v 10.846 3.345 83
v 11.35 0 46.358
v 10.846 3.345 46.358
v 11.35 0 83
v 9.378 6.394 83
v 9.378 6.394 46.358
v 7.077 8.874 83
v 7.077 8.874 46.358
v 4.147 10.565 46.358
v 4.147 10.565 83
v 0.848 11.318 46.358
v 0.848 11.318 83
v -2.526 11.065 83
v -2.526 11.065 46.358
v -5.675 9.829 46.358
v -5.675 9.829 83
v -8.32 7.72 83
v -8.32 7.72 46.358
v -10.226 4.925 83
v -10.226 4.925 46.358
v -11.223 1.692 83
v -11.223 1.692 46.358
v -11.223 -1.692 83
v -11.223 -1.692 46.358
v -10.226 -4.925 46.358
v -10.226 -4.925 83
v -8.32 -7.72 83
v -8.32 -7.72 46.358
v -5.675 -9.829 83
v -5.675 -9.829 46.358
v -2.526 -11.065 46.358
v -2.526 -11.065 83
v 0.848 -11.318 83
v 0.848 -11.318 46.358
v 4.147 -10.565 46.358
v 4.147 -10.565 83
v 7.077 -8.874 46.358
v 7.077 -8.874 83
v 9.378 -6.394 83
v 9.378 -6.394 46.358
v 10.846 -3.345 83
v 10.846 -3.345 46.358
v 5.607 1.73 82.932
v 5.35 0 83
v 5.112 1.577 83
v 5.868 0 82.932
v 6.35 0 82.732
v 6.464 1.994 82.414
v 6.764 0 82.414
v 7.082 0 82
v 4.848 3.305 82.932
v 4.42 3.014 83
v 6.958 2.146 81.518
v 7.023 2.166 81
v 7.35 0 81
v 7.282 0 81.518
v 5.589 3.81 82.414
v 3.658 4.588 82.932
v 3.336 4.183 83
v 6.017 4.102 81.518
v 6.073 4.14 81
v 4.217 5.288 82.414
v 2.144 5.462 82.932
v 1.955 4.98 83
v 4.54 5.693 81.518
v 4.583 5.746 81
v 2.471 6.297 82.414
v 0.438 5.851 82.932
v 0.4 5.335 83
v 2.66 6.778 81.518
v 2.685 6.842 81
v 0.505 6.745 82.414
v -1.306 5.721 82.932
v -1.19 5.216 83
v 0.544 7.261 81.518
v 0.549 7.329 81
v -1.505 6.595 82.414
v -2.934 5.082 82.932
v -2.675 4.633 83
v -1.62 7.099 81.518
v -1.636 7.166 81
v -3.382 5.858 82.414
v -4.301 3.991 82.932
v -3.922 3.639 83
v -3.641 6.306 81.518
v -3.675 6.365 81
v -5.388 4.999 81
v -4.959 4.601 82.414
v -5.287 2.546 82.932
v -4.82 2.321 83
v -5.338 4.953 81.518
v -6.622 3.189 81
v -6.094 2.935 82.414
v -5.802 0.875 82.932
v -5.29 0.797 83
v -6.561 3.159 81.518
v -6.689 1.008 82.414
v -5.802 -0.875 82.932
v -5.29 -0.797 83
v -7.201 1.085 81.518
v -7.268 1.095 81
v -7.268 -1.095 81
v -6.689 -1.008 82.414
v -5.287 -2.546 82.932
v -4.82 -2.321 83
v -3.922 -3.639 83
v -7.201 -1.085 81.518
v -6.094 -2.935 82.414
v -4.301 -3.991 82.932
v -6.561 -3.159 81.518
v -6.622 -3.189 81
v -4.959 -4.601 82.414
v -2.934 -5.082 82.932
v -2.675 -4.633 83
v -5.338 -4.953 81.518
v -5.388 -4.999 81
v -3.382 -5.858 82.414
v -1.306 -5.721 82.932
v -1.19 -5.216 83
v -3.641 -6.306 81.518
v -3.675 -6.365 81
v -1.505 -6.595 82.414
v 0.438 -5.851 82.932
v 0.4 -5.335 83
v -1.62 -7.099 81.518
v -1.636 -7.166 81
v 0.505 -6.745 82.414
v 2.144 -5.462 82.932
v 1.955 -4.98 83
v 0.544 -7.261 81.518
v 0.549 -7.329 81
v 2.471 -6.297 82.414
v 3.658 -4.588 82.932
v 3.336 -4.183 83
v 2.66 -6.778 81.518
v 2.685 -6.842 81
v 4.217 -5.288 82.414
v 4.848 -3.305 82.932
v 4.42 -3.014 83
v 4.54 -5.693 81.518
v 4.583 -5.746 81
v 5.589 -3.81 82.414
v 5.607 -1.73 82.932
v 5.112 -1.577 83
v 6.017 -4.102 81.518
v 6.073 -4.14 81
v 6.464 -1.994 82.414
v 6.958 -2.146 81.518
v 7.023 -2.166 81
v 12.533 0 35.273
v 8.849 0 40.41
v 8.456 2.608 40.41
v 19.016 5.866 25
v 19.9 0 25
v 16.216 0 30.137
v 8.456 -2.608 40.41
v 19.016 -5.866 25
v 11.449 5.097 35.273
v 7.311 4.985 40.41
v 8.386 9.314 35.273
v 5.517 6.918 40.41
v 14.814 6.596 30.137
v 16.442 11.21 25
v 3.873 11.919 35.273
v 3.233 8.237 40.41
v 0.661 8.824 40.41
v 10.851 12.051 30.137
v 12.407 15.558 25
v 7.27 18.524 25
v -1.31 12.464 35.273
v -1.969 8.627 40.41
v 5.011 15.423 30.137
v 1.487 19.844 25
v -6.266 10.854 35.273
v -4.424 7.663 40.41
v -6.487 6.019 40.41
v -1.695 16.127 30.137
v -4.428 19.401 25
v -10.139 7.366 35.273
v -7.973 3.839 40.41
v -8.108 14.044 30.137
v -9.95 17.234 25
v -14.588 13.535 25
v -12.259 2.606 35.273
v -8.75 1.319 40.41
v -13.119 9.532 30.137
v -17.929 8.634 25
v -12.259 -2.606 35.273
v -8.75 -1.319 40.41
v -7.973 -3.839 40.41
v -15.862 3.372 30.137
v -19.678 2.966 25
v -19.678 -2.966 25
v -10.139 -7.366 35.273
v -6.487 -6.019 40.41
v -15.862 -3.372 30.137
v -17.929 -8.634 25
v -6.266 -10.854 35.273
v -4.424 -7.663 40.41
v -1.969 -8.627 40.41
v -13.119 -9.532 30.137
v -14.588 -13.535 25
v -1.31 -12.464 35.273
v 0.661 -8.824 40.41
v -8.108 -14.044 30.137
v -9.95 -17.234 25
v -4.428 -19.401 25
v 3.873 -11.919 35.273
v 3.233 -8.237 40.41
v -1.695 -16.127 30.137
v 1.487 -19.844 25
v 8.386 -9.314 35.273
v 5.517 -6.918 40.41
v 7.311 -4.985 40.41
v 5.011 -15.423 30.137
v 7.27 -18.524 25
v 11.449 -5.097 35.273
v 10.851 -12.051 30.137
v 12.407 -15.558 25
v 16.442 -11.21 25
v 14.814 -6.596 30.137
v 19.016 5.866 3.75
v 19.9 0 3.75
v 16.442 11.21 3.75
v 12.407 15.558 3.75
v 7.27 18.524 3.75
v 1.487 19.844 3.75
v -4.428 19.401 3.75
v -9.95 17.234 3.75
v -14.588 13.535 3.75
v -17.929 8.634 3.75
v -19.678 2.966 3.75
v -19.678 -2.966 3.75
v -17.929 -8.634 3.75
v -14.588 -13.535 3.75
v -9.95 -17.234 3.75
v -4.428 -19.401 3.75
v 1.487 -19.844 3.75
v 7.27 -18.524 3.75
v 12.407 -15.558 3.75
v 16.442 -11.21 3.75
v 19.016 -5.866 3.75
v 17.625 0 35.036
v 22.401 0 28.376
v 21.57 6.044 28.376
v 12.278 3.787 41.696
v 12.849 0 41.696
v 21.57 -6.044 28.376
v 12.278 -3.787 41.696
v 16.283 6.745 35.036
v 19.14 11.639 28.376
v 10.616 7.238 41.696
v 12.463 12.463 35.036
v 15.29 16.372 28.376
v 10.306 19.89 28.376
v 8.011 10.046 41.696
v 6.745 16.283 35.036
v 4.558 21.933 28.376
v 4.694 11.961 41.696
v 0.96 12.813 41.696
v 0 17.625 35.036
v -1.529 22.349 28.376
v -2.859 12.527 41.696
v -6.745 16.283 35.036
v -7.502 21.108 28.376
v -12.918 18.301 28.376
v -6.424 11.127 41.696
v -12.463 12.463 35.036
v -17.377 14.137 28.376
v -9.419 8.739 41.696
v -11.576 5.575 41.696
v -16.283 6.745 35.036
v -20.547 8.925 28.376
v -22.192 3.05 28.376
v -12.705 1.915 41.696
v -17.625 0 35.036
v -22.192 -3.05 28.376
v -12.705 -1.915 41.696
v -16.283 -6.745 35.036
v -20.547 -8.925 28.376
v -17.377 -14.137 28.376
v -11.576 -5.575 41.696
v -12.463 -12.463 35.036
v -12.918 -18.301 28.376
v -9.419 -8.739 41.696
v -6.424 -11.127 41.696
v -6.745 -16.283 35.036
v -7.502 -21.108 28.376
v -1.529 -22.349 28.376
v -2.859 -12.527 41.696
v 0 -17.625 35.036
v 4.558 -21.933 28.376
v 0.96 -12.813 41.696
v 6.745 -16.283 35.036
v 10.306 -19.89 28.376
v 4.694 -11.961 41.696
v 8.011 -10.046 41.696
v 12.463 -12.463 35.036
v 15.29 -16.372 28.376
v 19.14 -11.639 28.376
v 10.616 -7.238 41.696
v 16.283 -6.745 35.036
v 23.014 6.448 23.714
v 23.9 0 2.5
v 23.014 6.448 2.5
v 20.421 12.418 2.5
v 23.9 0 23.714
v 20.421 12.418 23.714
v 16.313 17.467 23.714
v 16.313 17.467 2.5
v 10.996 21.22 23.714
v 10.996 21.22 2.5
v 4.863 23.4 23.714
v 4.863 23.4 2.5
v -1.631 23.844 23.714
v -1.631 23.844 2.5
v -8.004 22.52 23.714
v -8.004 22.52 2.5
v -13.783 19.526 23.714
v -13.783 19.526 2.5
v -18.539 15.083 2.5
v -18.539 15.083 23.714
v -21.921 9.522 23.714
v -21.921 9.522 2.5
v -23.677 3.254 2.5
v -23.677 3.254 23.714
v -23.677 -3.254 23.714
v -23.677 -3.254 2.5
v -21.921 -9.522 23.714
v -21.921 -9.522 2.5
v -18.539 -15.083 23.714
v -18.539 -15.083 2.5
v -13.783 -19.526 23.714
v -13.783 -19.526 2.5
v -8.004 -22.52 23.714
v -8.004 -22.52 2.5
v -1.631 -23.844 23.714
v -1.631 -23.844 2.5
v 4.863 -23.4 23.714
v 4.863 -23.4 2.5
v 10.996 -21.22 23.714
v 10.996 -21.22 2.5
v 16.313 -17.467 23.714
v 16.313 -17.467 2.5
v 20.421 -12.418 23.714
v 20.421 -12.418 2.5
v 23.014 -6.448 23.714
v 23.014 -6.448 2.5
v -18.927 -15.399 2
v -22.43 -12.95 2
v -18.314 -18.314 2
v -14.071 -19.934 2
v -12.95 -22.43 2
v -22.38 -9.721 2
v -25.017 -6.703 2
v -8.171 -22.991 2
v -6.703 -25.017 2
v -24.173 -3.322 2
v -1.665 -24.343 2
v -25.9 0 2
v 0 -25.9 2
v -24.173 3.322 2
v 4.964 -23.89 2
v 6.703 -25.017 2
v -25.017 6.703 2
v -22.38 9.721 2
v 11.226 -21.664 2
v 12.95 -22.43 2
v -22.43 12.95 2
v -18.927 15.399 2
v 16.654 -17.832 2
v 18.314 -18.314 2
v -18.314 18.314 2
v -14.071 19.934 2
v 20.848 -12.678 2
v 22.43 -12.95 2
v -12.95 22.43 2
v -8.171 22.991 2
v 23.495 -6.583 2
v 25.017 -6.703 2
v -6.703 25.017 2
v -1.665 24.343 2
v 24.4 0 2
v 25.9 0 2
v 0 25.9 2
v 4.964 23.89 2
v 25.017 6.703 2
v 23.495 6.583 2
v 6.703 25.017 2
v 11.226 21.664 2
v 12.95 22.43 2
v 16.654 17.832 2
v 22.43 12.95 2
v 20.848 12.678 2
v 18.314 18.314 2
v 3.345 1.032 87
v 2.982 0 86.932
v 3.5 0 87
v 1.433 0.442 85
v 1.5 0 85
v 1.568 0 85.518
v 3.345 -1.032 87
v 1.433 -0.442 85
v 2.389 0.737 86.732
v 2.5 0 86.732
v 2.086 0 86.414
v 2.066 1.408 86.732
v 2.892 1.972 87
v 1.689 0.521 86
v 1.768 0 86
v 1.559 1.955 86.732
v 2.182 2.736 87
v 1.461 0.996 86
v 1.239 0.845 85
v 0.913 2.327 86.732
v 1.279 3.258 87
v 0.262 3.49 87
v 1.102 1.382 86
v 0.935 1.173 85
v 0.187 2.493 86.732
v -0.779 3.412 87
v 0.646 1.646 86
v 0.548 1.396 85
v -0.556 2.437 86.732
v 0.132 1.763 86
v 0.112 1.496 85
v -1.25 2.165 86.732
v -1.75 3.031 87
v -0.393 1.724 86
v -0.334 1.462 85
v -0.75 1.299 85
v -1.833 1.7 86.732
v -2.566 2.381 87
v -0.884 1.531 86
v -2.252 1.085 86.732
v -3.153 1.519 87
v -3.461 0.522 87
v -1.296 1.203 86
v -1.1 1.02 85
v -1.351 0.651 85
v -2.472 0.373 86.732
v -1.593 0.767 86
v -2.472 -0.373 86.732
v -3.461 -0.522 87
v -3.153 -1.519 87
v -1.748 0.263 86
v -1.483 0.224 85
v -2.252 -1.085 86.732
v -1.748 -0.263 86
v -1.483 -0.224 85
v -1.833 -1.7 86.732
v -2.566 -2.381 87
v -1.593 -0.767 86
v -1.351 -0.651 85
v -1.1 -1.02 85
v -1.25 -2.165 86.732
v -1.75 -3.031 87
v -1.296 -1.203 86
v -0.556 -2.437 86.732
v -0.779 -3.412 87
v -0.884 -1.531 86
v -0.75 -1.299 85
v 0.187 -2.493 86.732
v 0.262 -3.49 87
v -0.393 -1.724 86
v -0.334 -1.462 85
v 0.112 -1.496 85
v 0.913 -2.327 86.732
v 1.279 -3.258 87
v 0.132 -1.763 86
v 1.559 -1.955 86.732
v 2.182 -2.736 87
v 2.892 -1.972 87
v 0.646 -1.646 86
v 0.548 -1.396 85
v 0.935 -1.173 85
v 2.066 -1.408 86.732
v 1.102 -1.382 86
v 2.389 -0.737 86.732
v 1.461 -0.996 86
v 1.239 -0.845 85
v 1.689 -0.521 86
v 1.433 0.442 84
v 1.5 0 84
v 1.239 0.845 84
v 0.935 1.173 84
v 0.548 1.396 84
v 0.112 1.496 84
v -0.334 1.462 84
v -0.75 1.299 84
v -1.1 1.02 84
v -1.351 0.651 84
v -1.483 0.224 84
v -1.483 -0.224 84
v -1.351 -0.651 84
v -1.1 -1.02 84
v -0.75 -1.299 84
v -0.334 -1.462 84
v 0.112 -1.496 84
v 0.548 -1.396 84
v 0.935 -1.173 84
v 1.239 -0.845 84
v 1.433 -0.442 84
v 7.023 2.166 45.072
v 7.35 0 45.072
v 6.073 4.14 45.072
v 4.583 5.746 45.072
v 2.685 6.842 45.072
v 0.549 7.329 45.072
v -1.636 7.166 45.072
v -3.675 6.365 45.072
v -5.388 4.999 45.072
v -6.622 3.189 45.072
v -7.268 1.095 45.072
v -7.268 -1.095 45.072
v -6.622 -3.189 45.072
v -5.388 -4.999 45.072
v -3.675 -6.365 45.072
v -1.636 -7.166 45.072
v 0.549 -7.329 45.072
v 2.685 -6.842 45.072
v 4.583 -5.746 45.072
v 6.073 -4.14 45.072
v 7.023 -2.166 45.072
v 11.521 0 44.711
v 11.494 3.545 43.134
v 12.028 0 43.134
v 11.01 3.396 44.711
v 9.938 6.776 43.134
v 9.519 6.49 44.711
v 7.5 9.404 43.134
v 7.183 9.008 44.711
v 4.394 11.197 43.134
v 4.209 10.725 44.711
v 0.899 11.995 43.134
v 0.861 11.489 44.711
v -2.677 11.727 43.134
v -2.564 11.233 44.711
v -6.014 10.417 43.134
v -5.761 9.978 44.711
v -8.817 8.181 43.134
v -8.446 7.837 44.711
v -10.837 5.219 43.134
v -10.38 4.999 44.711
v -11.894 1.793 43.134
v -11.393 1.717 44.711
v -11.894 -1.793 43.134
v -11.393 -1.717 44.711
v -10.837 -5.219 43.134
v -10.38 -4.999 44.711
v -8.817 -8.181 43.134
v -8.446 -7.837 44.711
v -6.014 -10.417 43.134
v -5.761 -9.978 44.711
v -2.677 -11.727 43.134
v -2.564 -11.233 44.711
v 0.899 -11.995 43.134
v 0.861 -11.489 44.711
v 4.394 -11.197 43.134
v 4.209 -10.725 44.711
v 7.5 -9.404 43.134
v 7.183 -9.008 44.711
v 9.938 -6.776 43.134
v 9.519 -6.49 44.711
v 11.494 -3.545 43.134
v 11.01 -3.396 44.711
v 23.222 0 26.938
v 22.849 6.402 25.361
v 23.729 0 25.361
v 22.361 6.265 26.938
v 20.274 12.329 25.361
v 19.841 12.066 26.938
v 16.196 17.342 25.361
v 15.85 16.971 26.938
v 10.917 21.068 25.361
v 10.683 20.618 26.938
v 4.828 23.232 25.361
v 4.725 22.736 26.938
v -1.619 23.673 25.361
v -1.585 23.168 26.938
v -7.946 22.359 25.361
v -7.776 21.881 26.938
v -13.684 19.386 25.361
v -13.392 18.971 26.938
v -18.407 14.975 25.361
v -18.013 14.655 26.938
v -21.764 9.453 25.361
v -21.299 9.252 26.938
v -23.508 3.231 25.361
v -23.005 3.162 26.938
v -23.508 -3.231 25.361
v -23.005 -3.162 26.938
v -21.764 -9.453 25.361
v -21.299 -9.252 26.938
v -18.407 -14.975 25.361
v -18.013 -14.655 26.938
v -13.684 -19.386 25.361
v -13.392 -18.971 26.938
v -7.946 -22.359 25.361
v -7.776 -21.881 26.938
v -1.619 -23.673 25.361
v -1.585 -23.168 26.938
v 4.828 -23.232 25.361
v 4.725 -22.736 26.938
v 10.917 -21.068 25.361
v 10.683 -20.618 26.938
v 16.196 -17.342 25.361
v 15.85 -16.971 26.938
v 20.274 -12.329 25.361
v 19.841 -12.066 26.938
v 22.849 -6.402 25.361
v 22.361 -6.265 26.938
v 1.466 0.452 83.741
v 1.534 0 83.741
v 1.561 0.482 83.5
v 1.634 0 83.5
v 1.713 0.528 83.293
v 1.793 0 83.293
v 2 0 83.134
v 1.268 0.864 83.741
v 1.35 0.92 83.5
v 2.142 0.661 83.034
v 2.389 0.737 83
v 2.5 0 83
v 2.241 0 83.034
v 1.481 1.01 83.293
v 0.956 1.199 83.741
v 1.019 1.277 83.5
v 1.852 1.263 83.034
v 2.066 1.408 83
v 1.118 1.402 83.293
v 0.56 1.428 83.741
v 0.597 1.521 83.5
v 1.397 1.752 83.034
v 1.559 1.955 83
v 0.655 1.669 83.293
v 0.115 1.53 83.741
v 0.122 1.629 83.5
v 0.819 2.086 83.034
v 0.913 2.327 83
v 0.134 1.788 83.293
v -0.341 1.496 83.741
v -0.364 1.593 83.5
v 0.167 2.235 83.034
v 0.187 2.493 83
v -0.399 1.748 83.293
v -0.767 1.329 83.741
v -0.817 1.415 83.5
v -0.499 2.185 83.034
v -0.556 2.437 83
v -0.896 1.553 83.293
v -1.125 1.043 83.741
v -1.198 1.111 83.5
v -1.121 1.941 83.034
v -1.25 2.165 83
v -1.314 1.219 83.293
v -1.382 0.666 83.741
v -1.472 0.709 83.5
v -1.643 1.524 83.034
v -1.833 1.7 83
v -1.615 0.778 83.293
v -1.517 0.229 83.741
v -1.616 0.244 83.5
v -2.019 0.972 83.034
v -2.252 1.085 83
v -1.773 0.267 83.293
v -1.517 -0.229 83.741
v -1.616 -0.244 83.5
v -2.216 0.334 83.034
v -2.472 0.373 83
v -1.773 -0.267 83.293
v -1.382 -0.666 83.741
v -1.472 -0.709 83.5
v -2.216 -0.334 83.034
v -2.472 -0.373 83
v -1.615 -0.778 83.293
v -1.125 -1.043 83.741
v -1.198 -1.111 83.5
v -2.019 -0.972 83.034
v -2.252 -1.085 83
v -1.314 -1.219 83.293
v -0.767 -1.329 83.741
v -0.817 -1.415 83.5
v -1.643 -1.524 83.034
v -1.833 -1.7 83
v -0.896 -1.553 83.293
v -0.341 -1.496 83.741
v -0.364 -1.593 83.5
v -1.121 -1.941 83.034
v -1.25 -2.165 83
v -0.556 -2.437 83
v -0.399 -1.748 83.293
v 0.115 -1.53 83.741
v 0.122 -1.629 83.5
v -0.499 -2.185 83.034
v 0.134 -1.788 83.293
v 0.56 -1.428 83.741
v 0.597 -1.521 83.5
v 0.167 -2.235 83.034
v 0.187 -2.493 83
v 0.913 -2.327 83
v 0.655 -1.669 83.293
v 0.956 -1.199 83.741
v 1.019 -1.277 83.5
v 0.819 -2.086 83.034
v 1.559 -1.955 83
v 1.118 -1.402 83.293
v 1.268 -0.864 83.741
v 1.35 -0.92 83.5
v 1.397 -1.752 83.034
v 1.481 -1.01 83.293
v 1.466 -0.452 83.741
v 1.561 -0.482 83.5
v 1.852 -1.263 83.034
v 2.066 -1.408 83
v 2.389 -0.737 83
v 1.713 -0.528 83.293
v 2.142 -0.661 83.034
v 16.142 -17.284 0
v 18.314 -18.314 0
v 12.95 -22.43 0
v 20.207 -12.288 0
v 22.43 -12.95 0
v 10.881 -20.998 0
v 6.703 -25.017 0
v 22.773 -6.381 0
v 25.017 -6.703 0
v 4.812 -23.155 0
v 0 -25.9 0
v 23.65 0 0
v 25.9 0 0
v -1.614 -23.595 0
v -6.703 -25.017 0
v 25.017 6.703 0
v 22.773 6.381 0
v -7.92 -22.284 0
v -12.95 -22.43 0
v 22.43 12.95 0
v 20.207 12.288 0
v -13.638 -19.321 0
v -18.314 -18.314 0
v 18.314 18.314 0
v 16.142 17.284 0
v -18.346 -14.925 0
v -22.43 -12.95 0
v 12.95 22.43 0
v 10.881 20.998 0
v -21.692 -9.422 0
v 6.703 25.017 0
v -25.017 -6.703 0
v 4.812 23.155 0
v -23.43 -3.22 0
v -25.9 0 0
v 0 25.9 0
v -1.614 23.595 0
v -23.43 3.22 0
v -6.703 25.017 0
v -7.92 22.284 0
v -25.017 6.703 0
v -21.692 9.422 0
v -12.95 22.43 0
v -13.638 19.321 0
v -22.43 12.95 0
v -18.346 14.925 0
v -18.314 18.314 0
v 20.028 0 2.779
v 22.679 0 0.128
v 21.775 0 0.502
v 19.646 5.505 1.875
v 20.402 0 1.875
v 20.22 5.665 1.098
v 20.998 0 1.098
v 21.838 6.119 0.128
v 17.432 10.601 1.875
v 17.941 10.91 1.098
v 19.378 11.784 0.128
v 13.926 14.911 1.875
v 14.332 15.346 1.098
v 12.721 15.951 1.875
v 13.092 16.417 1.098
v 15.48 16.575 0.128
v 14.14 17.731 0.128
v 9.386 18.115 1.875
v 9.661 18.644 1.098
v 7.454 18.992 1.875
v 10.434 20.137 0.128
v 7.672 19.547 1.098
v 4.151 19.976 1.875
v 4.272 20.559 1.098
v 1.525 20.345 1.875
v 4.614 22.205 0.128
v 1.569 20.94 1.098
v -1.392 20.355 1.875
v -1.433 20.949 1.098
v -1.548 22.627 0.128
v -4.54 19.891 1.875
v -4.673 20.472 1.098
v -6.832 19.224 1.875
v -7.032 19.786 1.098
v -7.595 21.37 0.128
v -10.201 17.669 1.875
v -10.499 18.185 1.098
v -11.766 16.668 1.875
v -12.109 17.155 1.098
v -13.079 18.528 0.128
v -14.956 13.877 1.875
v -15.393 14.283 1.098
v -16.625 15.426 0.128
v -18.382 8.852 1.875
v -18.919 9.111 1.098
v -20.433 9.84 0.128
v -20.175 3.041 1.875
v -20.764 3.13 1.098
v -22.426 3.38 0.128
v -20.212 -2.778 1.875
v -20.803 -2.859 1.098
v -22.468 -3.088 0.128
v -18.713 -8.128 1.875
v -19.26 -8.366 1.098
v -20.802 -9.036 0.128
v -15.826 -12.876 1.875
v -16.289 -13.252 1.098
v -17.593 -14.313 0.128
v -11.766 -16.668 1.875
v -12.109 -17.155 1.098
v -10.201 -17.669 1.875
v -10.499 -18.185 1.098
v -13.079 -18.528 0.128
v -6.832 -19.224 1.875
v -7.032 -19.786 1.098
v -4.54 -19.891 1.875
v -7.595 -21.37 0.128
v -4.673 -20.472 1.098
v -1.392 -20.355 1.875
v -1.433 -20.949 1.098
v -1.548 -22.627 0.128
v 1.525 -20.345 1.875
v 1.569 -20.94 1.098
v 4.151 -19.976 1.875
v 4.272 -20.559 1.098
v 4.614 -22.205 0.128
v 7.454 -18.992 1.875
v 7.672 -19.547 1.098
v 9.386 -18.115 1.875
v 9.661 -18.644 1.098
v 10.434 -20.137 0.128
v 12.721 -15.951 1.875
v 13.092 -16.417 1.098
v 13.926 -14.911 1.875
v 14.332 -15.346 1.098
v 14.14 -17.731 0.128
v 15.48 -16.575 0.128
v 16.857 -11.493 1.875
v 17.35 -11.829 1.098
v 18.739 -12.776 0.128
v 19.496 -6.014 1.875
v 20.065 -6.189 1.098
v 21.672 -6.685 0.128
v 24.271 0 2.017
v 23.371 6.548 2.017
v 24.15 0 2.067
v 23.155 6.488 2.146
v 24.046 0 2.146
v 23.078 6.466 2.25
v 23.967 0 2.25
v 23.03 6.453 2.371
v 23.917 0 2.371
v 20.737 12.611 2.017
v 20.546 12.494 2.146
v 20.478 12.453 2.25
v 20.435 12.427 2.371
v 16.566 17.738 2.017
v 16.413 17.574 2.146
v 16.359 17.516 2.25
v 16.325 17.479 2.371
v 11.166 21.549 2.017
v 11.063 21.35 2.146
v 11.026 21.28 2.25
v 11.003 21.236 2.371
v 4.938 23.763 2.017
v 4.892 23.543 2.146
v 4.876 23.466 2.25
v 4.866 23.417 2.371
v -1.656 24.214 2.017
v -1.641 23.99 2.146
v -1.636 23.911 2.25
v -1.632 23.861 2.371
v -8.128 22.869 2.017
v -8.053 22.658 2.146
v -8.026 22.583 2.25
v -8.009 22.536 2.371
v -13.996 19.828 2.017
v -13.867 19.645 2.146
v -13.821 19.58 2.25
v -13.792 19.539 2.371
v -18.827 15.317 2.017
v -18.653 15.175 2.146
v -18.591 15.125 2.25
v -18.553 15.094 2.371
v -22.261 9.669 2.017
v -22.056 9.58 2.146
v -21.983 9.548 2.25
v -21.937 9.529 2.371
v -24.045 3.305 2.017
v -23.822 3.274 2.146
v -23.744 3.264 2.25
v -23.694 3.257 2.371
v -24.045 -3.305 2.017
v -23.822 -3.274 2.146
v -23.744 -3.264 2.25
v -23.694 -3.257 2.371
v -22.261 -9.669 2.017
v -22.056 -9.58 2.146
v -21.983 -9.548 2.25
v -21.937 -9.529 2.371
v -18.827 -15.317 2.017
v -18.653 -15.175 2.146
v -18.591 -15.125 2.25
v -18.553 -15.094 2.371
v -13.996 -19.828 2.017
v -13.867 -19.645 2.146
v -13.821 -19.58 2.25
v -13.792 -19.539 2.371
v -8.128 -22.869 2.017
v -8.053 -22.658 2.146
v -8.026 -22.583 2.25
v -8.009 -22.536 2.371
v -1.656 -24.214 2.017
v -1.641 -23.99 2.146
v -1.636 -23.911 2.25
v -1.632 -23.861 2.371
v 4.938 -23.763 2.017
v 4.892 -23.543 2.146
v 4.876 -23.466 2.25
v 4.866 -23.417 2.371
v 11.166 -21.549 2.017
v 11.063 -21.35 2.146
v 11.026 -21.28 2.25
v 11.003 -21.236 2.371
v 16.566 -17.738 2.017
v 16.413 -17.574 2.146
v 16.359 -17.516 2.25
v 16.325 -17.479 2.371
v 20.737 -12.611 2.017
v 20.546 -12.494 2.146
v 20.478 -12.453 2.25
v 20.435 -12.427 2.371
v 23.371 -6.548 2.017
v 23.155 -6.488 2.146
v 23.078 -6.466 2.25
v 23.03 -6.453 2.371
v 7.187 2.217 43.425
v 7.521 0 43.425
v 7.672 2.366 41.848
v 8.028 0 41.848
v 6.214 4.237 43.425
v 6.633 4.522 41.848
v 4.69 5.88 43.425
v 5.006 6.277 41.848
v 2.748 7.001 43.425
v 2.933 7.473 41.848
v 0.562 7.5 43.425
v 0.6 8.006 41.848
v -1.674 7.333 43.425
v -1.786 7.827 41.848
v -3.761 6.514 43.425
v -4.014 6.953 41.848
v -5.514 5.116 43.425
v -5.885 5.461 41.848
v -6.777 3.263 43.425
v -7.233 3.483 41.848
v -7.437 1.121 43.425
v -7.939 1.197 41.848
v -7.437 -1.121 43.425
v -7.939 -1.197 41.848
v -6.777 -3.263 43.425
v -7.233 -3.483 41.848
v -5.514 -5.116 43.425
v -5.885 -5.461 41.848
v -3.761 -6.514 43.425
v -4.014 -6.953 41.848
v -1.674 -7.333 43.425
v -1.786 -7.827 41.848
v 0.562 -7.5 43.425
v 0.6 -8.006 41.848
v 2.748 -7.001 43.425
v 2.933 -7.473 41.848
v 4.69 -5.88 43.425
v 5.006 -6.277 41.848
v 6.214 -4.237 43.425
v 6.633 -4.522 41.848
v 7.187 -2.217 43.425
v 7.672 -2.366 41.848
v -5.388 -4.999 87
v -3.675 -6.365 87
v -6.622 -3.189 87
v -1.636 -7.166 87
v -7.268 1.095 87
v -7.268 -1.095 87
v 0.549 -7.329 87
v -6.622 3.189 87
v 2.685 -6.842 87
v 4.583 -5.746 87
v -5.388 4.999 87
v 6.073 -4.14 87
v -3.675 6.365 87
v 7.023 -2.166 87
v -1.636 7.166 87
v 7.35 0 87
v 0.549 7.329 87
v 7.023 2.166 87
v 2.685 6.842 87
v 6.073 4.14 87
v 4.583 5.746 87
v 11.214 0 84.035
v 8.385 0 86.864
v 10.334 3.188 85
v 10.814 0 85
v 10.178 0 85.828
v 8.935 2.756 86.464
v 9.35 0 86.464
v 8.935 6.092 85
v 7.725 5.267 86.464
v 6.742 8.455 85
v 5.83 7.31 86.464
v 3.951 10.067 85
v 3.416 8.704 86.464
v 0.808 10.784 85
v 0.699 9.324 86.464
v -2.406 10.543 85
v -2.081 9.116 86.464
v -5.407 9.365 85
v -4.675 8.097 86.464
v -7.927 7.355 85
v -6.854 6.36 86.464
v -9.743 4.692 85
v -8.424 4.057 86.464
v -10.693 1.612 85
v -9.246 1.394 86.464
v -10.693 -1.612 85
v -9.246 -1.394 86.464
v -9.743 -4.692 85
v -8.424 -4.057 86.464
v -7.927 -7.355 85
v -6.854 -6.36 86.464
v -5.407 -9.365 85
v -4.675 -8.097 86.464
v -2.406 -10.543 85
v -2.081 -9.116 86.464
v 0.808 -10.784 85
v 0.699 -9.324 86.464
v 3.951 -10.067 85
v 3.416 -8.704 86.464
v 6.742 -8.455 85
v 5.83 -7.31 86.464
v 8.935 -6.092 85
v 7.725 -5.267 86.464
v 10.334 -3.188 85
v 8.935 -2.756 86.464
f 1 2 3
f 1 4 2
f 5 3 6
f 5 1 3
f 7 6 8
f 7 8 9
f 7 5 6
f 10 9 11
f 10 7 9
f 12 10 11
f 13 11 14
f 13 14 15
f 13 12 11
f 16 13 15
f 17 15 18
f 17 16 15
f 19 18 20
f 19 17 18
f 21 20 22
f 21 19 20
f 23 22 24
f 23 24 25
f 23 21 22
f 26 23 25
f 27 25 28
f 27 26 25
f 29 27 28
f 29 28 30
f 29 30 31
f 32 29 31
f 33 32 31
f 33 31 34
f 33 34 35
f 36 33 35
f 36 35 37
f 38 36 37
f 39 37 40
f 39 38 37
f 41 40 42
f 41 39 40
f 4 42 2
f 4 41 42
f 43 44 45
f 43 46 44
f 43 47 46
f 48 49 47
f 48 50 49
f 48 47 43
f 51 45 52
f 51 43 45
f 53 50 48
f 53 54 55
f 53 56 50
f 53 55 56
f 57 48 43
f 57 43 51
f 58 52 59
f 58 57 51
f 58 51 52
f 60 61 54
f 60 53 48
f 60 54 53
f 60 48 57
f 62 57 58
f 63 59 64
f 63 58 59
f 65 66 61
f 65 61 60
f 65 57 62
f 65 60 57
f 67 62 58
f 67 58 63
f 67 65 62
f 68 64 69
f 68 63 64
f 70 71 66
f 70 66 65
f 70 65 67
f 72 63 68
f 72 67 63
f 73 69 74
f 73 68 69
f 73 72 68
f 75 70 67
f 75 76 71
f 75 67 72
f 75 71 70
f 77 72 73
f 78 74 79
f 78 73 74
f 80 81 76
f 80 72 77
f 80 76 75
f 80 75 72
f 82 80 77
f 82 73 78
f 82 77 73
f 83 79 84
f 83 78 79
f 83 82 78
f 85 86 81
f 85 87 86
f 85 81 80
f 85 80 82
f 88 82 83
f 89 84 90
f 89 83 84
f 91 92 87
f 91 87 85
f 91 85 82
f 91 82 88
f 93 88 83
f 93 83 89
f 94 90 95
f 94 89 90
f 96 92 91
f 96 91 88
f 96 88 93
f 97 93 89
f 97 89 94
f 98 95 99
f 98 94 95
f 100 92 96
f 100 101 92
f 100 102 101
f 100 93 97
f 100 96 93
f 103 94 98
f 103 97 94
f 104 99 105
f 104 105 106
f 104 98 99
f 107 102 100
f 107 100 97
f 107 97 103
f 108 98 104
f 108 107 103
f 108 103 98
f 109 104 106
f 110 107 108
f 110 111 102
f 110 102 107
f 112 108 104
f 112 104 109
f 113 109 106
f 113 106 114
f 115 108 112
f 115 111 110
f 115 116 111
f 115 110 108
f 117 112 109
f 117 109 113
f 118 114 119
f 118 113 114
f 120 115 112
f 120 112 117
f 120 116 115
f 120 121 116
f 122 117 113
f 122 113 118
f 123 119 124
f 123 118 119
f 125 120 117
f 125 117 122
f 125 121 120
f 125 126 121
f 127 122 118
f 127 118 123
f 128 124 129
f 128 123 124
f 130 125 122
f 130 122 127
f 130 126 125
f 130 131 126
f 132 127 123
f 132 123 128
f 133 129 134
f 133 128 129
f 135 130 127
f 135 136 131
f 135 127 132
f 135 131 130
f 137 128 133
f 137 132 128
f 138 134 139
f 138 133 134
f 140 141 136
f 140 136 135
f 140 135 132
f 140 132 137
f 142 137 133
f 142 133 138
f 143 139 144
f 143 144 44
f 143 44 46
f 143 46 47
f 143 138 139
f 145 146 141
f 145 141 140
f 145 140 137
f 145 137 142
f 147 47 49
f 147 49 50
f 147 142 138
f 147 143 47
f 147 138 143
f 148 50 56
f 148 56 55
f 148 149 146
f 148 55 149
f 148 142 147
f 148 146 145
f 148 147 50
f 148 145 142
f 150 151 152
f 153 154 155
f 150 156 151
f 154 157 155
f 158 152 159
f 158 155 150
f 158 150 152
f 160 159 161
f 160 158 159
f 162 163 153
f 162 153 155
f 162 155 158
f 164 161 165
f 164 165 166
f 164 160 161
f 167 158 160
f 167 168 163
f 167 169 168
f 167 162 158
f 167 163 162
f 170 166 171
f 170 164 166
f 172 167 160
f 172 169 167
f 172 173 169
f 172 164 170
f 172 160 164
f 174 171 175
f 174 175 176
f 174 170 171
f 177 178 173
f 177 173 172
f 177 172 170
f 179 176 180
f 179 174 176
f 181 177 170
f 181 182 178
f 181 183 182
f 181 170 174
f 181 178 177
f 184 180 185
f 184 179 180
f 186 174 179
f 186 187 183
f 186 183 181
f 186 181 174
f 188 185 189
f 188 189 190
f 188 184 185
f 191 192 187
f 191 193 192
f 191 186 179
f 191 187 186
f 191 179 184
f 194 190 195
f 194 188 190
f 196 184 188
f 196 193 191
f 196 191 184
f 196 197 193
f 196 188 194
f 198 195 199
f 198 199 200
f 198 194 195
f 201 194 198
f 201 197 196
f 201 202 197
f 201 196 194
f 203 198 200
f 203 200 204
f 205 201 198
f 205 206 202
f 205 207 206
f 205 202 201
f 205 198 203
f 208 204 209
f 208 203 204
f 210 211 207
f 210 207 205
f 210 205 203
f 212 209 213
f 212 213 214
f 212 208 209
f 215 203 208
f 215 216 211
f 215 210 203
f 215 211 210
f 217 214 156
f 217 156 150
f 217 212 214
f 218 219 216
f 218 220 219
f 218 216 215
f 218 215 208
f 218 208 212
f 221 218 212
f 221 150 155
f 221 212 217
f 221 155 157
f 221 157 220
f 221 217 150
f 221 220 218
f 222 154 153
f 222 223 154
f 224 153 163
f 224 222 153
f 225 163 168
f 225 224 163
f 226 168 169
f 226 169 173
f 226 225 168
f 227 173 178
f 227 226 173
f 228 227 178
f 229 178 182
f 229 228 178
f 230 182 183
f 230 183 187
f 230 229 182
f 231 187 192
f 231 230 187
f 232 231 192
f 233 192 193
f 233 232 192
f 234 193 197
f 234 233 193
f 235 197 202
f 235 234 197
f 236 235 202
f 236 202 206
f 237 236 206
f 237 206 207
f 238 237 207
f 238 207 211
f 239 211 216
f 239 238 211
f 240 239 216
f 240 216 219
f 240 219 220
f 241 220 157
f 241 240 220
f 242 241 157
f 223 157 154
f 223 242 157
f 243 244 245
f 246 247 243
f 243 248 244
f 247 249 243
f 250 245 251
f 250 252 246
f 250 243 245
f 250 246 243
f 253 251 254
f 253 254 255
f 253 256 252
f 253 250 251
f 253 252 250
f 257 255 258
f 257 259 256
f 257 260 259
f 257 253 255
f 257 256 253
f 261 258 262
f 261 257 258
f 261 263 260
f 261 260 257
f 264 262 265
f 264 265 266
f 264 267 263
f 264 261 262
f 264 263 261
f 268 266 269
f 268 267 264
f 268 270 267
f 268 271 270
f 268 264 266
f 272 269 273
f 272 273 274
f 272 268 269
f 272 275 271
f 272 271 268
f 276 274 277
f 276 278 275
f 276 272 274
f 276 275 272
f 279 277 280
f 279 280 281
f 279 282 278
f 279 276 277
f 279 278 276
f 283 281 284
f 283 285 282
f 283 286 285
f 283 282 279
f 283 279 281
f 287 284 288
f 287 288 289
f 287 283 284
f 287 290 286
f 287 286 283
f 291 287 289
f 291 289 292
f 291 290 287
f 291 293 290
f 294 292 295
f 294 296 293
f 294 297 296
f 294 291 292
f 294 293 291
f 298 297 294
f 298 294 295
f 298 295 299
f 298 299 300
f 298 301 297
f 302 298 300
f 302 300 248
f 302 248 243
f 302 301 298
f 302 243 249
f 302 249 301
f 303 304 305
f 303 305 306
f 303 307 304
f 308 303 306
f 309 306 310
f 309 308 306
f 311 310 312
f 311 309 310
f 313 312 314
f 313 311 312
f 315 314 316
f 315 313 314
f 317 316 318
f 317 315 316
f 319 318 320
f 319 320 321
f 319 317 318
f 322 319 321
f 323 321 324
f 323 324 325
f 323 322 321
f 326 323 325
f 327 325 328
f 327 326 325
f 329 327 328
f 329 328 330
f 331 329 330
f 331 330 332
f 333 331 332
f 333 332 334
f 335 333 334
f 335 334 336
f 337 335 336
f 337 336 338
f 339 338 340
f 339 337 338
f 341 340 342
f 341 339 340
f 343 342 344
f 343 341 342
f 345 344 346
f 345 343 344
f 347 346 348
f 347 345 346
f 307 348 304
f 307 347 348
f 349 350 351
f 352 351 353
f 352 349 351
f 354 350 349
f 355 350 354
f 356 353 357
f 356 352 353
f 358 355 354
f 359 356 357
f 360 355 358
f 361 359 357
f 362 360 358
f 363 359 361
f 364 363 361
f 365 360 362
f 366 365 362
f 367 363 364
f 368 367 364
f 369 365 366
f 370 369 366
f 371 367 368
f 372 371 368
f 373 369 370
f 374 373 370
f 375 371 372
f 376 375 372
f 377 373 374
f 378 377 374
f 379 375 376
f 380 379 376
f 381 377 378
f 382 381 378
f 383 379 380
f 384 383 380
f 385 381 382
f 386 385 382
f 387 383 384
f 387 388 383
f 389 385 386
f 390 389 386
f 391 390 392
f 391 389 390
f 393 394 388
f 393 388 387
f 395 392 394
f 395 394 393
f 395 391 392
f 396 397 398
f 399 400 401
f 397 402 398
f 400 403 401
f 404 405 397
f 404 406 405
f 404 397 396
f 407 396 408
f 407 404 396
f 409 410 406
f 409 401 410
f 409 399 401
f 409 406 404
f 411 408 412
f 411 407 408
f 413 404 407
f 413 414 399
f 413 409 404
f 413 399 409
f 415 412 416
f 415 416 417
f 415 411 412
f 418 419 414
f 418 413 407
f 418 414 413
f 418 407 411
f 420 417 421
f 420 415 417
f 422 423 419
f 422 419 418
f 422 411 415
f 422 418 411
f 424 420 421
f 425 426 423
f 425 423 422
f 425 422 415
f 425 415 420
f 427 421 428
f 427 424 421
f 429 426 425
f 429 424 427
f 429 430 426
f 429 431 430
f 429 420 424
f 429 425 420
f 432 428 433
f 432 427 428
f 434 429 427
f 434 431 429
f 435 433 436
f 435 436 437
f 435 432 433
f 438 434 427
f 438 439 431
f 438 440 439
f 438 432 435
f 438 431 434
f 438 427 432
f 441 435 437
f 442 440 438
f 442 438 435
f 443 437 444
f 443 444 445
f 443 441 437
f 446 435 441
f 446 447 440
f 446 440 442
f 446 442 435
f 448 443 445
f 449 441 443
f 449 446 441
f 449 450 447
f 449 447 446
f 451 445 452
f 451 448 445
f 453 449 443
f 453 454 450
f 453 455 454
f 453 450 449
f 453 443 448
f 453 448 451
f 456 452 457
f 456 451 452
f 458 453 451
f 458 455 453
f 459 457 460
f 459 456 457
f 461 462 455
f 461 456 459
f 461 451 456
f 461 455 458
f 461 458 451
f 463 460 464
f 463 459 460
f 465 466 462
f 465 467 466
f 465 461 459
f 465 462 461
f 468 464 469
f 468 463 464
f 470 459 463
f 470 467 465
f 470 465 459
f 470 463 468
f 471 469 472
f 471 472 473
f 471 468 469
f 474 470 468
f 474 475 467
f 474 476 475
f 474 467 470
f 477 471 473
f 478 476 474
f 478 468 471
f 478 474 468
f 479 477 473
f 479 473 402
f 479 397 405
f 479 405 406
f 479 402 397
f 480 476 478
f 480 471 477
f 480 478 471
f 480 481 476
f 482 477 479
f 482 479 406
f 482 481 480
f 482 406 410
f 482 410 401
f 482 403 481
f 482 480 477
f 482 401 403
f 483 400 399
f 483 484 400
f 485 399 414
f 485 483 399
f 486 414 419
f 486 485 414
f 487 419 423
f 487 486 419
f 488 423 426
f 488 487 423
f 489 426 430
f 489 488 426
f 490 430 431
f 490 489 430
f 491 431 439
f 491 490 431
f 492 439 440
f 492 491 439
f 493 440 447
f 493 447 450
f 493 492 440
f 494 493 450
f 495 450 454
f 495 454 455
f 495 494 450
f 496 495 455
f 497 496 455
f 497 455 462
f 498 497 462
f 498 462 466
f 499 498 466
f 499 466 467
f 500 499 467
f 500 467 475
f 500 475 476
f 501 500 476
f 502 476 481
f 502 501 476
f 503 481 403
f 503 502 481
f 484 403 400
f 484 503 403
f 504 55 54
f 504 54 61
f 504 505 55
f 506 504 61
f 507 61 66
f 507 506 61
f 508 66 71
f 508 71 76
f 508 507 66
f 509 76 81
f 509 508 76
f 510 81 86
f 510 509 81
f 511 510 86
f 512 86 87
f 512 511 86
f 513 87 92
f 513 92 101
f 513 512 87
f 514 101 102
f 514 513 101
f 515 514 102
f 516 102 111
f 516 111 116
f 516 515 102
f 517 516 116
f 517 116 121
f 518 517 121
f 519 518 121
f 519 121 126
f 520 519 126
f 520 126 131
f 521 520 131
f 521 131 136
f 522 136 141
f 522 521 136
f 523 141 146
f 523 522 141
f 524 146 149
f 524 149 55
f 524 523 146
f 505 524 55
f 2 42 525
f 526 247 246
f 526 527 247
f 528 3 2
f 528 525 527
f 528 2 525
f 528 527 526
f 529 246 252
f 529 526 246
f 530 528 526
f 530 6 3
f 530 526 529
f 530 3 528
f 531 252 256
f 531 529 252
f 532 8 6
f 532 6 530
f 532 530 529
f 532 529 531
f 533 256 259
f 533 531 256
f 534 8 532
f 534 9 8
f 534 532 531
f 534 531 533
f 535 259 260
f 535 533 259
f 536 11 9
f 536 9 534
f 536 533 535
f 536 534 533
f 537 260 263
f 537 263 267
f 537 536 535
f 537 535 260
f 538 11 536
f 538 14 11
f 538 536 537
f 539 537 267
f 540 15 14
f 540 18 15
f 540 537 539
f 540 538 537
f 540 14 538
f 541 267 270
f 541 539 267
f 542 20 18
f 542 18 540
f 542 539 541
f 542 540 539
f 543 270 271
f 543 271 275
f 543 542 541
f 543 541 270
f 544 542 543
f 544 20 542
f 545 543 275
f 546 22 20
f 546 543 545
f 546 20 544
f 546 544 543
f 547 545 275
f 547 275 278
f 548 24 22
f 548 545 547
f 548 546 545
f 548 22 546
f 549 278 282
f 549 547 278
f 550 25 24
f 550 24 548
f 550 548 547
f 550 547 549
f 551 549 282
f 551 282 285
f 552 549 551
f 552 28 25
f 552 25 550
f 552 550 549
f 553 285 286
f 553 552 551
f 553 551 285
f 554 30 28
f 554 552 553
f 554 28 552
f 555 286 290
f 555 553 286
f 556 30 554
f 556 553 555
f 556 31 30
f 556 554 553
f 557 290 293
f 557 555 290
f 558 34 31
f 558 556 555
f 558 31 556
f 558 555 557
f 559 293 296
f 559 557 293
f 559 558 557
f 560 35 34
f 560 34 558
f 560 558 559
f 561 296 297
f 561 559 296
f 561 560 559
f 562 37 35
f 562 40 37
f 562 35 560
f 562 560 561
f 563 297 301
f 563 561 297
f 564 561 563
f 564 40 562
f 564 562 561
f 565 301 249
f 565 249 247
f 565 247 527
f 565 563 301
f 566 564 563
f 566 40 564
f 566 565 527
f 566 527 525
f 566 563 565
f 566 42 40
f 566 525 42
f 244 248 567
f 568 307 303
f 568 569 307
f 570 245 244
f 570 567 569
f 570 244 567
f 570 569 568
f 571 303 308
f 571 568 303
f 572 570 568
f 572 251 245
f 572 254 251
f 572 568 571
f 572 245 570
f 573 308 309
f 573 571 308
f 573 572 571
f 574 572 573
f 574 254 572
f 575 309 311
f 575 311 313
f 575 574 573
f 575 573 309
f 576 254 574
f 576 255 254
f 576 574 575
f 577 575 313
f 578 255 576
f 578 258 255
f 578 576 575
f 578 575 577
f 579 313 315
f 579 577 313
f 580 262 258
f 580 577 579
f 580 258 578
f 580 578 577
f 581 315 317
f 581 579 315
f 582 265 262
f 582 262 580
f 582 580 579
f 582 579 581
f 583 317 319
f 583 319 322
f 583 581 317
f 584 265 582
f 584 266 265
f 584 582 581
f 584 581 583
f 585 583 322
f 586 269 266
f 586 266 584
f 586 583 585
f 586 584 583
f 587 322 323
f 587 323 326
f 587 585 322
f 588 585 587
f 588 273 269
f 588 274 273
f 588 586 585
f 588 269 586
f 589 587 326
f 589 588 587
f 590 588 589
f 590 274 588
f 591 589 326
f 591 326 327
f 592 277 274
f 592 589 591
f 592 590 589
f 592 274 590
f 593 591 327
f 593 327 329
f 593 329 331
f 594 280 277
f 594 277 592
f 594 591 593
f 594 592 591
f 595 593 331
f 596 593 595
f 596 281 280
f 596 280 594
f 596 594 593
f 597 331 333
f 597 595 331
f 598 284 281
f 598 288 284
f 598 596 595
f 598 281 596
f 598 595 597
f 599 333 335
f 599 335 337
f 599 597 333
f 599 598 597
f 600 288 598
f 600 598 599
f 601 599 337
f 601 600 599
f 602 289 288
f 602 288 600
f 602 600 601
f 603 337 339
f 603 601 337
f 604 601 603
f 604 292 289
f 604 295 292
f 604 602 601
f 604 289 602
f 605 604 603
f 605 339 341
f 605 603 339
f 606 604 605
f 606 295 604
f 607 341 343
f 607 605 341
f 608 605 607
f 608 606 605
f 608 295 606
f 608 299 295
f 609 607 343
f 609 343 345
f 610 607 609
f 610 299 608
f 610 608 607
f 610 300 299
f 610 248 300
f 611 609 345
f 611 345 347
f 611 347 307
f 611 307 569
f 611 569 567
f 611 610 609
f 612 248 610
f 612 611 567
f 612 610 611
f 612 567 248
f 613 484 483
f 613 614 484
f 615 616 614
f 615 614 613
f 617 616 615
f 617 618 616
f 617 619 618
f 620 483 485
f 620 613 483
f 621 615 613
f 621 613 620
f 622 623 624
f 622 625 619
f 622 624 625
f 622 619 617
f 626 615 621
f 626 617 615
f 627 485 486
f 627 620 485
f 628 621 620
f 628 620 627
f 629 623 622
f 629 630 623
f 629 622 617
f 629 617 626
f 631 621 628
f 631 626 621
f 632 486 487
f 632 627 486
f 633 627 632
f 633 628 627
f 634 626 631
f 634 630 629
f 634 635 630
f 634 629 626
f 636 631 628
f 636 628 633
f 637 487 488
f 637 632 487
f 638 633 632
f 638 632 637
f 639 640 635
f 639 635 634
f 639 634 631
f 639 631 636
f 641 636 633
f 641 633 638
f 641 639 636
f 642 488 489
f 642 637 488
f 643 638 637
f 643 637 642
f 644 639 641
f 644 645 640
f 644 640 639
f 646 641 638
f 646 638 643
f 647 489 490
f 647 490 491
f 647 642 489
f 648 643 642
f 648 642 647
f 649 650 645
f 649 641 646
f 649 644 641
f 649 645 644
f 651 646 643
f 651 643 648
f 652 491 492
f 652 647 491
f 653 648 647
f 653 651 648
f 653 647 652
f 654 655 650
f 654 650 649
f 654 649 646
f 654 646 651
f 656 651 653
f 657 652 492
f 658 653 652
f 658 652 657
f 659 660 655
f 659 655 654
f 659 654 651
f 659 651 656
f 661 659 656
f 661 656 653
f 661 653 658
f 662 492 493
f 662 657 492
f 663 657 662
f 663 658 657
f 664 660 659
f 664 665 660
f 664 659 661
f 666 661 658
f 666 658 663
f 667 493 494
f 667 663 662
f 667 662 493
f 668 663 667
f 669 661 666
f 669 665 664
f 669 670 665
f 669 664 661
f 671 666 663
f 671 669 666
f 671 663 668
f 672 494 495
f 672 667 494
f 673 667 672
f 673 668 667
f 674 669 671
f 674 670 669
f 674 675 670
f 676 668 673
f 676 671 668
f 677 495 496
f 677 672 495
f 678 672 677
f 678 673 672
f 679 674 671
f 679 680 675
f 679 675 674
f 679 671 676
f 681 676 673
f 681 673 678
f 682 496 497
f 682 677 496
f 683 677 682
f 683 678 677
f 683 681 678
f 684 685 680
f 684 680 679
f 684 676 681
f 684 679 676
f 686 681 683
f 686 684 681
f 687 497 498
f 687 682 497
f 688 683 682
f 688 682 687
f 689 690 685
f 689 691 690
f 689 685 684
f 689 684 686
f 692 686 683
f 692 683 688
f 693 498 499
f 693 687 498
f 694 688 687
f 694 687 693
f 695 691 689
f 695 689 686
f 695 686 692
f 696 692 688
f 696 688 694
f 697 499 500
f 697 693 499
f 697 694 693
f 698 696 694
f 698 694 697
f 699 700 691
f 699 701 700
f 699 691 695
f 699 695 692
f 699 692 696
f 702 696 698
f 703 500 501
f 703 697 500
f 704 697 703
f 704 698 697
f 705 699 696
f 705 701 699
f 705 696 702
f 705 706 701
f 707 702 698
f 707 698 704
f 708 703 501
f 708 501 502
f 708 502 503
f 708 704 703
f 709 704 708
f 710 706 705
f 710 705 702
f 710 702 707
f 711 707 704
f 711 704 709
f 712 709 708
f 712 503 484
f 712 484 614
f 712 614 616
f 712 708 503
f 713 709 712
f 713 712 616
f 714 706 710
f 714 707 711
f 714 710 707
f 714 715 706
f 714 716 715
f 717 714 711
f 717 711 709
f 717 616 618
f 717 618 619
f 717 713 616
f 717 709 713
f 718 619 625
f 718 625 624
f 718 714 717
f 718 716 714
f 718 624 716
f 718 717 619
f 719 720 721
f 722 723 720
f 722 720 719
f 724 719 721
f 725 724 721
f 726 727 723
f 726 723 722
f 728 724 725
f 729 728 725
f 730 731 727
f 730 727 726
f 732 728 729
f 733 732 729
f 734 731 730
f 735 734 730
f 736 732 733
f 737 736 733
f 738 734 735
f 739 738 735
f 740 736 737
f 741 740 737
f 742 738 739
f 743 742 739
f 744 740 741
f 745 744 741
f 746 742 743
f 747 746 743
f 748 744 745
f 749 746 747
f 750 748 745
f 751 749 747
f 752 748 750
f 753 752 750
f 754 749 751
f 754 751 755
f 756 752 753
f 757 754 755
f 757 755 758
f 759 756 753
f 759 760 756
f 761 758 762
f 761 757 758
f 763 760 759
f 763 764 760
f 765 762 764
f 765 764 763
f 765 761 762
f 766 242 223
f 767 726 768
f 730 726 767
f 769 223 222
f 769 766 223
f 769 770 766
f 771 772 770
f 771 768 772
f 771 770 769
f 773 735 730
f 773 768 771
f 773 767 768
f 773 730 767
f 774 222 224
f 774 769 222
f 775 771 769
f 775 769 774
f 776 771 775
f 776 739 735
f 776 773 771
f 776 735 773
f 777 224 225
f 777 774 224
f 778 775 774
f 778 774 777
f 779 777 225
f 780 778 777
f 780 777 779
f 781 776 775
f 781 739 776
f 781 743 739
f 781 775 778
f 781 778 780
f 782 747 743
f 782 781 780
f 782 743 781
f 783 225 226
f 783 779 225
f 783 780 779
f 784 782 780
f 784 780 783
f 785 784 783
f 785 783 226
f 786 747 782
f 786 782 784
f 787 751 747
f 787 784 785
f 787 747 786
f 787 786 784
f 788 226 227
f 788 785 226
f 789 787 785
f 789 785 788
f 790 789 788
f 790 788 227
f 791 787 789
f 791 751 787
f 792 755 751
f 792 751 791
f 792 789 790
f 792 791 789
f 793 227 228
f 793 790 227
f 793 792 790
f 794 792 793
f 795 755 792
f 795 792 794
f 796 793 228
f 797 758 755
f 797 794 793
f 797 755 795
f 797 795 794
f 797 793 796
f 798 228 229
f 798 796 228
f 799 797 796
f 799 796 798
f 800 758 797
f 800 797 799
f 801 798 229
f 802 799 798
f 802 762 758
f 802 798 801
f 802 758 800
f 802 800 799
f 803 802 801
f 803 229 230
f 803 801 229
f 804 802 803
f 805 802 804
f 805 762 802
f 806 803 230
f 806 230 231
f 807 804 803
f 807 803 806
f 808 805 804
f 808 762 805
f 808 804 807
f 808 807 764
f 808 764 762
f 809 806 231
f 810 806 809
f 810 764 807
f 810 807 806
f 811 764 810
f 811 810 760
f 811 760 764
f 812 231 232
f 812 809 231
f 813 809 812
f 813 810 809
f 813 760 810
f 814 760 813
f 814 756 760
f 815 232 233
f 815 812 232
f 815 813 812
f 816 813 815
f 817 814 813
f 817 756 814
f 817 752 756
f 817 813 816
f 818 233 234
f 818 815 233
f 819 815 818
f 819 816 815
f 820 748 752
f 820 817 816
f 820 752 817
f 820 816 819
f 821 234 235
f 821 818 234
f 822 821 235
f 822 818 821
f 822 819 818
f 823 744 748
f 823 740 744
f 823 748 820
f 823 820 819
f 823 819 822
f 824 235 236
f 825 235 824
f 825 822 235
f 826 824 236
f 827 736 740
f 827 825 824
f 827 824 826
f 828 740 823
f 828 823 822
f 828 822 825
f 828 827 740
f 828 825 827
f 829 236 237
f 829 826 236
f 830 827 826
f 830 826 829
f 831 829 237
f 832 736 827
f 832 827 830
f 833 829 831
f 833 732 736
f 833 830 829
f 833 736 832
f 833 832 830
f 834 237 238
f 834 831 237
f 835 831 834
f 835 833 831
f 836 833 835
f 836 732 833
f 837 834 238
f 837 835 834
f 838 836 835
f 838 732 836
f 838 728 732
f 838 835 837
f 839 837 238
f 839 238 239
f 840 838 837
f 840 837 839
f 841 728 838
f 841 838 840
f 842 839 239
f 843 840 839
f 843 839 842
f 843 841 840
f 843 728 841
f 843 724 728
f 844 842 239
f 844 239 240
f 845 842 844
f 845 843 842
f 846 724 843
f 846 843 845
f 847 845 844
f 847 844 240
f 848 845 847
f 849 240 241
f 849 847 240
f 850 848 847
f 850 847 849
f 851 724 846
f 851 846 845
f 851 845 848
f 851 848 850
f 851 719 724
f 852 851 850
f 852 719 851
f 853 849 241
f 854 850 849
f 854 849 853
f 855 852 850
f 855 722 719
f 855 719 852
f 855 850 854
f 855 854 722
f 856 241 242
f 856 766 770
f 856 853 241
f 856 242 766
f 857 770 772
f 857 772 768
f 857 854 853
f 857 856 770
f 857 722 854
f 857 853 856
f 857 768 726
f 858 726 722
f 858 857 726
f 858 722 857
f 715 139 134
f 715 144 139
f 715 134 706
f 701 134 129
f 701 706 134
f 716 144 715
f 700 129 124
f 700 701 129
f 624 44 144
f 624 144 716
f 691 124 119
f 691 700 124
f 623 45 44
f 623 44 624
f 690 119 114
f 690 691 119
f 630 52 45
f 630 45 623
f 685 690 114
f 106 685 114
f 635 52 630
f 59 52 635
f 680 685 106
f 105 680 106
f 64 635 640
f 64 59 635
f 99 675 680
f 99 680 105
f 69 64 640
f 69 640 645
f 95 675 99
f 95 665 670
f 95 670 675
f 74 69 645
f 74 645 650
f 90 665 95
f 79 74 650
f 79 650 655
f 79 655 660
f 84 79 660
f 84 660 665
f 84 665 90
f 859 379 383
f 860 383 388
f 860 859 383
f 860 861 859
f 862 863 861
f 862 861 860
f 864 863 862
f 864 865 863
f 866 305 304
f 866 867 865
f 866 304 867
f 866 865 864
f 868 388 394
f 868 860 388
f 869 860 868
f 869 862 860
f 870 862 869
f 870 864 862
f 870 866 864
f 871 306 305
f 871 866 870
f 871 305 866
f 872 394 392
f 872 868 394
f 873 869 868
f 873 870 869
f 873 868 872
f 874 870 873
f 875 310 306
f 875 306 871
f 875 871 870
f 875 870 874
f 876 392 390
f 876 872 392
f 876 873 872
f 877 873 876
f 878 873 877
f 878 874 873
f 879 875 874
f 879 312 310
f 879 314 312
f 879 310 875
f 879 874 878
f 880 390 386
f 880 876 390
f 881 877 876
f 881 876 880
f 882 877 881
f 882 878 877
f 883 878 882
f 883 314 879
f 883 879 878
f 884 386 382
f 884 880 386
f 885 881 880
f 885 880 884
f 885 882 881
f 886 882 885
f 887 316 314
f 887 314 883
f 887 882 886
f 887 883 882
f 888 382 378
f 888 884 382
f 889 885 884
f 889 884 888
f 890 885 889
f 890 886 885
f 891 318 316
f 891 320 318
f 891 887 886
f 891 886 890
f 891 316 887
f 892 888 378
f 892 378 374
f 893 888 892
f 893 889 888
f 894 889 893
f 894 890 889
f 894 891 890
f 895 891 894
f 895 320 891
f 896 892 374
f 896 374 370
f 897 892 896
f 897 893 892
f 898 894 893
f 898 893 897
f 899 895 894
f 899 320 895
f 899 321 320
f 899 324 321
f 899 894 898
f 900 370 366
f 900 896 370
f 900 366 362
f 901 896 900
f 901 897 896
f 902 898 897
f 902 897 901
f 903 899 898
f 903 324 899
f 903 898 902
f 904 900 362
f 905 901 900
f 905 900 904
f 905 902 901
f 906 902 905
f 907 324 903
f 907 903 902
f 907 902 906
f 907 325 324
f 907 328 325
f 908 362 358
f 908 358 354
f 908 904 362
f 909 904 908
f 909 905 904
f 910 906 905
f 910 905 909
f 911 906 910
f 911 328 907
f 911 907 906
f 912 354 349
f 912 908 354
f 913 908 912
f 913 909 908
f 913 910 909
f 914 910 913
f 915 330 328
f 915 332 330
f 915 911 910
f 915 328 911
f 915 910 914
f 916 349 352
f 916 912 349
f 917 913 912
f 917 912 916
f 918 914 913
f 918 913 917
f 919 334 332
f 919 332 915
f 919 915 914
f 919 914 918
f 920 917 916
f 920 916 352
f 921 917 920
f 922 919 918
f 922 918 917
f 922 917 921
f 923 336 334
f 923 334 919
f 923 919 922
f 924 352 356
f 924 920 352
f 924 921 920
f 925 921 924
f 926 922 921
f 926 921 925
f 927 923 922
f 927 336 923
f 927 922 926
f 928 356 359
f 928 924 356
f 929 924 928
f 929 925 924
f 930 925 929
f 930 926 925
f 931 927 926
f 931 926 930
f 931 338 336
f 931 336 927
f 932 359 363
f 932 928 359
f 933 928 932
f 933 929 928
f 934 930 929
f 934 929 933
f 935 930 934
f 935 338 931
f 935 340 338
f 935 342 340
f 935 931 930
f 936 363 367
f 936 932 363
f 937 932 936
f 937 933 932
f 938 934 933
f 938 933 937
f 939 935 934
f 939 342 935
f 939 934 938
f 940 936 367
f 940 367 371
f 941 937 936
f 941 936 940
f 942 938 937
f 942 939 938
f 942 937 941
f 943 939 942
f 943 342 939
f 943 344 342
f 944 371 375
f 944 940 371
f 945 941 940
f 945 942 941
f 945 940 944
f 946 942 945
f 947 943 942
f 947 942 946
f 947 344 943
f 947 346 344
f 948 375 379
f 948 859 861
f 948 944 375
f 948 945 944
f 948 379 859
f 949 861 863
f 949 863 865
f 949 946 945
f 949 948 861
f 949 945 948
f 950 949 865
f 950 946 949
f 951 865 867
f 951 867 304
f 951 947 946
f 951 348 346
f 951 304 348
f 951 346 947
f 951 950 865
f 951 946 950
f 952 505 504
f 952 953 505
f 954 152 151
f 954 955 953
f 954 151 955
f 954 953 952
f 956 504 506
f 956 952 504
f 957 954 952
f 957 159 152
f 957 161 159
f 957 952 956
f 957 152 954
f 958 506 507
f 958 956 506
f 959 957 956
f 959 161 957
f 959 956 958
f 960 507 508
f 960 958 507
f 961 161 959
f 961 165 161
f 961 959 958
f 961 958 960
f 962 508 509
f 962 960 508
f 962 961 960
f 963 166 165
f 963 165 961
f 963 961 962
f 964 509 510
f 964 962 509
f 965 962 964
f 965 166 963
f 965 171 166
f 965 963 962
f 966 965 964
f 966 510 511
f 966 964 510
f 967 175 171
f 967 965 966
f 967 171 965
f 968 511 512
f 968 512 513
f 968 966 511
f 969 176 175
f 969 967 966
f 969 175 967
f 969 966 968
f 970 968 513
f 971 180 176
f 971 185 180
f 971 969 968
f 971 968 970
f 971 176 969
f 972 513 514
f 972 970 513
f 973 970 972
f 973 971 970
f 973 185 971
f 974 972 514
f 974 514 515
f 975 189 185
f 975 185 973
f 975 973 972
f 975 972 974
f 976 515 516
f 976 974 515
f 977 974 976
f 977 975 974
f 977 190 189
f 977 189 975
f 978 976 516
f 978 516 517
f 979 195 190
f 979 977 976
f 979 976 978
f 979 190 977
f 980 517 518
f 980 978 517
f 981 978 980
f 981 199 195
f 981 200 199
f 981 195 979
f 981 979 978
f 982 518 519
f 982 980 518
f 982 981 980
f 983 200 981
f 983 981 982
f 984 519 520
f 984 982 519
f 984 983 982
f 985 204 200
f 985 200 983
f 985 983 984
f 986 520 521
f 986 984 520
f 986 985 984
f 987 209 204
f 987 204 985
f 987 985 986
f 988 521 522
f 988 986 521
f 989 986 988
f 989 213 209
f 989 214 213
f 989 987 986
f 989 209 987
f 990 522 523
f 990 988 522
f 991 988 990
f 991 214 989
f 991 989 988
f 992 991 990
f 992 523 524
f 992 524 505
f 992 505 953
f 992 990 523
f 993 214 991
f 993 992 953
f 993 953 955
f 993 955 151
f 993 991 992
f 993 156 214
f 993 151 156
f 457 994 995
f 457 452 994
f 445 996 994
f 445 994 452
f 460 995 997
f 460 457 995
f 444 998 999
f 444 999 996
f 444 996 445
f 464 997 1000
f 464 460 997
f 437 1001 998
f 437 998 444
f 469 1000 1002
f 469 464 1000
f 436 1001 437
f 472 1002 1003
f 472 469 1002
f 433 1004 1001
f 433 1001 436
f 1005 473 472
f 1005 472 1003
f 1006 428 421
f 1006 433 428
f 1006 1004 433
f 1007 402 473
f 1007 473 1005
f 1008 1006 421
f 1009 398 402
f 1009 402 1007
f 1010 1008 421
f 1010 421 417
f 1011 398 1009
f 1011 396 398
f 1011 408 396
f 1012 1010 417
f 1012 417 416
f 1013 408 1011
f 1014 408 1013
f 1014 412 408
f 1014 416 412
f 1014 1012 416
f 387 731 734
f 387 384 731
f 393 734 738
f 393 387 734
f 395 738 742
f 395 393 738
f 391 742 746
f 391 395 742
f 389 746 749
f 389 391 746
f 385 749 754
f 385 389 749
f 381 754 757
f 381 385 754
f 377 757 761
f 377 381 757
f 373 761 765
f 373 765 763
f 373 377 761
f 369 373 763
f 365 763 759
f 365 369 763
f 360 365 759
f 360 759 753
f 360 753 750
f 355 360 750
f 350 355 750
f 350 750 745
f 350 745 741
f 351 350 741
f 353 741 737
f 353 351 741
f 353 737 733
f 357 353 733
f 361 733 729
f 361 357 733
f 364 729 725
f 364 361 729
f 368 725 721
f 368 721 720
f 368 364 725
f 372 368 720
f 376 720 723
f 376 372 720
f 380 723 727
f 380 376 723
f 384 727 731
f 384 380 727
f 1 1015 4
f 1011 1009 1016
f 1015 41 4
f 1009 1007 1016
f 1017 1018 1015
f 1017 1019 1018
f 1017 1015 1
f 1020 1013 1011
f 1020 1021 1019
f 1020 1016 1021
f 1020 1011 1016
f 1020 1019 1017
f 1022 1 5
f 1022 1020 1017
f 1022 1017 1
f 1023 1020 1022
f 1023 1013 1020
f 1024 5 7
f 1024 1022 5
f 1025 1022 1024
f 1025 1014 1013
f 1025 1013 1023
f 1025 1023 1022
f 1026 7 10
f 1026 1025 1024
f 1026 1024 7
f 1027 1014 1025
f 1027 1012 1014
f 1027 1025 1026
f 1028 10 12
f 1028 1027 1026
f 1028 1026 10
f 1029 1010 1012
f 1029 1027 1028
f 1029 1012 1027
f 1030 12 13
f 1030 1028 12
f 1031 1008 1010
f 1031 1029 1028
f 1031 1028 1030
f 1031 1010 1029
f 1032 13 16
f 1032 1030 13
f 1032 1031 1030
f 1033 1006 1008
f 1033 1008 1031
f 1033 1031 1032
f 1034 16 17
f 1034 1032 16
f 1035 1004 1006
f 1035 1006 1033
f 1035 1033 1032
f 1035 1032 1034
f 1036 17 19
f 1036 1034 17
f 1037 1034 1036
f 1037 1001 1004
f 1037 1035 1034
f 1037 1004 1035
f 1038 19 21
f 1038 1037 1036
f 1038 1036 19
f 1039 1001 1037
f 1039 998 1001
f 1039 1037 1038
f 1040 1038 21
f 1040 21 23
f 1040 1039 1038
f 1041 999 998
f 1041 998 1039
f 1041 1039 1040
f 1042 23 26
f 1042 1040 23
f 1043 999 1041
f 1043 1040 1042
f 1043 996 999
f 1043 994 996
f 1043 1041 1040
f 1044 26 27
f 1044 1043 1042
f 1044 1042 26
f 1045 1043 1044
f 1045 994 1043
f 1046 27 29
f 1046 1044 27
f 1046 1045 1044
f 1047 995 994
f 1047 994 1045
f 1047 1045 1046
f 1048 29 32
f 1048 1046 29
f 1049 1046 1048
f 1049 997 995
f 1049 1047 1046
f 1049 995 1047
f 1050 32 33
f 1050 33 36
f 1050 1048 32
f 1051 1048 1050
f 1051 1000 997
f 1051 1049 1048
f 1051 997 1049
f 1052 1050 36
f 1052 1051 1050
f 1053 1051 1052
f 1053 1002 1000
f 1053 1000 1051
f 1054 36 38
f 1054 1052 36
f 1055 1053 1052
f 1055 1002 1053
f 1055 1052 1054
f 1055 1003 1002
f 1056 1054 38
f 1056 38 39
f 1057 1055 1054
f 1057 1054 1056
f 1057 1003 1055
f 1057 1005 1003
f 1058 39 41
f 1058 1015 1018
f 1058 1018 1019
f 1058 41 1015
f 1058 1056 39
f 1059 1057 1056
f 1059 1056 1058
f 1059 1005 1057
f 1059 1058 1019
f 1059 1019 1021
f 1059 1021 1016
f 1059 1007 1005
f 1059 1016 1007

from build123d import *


with BuildPart() as f2:
    # F0 (on Front) → F2 (revolve)
    with BuildSketch(Plane.XZ):
        with BuildLine():
            Line((19.9, 25), (19.9, 3.75))
            ThreePointArc((19.9, 3.75), (20.99835, 1.09835), (23.65, 0))
            Line((23.65, 0), (23.9, 0))
            Line((23.9, 0), (25.9, 0))
            Line((25.9, 0), (25.9, 2))
            Line((25.9, 2), (24.4, 2))
            ThreePointArc((24.4, 2), (24.046447, 2.146447), (23.9, 2.5))
            Line((23.9, 2.5), (23.9, 23.713972))
            ThreePointArc((23.9, 23.713972), (23.516054, 26.162587), (22.401071, 28.376168))
            Line((22.401071, 28.376168), (12.848929, 41.695888))
            ThreePointArc((12.848929, 41.695888), (11.733946, 43.909469), (11.35, 46.358085))
            Line((11.35, 46.358085), (11.35, 83))
            ThreePointArc((11.35, 83), (10.178427, 85.828427), (7.35, 87))
            Line((7.35, 87), (3.5, 87))
            ThreePointArc((3.5, 87), (2.085786, 86.414214), (1.5, 85))
            Line((1.5, 85), (1.5, 84))
            ThreePointArc((1.5, 84), (1.792893, 83.292893), (2.5, 83))
            Line((2.5, 83), (5.35, 83))
            ThreePointArc((5.35, 83), (6.764214, 82.414214), (7.35, 81))
            Line((7.35, 81), (7.35, 45.072056))
            ThreePointArc((7.35, 45.072056), (7.733946, 42.623441), (8.848929, 40.40986))
            Line((8.848929, 40.40986), (19.9, 25))
        make_face()
    revolve(axis=Axis((0, 0, 13.469479), (0, 0, 1)))


solid = f2.part
